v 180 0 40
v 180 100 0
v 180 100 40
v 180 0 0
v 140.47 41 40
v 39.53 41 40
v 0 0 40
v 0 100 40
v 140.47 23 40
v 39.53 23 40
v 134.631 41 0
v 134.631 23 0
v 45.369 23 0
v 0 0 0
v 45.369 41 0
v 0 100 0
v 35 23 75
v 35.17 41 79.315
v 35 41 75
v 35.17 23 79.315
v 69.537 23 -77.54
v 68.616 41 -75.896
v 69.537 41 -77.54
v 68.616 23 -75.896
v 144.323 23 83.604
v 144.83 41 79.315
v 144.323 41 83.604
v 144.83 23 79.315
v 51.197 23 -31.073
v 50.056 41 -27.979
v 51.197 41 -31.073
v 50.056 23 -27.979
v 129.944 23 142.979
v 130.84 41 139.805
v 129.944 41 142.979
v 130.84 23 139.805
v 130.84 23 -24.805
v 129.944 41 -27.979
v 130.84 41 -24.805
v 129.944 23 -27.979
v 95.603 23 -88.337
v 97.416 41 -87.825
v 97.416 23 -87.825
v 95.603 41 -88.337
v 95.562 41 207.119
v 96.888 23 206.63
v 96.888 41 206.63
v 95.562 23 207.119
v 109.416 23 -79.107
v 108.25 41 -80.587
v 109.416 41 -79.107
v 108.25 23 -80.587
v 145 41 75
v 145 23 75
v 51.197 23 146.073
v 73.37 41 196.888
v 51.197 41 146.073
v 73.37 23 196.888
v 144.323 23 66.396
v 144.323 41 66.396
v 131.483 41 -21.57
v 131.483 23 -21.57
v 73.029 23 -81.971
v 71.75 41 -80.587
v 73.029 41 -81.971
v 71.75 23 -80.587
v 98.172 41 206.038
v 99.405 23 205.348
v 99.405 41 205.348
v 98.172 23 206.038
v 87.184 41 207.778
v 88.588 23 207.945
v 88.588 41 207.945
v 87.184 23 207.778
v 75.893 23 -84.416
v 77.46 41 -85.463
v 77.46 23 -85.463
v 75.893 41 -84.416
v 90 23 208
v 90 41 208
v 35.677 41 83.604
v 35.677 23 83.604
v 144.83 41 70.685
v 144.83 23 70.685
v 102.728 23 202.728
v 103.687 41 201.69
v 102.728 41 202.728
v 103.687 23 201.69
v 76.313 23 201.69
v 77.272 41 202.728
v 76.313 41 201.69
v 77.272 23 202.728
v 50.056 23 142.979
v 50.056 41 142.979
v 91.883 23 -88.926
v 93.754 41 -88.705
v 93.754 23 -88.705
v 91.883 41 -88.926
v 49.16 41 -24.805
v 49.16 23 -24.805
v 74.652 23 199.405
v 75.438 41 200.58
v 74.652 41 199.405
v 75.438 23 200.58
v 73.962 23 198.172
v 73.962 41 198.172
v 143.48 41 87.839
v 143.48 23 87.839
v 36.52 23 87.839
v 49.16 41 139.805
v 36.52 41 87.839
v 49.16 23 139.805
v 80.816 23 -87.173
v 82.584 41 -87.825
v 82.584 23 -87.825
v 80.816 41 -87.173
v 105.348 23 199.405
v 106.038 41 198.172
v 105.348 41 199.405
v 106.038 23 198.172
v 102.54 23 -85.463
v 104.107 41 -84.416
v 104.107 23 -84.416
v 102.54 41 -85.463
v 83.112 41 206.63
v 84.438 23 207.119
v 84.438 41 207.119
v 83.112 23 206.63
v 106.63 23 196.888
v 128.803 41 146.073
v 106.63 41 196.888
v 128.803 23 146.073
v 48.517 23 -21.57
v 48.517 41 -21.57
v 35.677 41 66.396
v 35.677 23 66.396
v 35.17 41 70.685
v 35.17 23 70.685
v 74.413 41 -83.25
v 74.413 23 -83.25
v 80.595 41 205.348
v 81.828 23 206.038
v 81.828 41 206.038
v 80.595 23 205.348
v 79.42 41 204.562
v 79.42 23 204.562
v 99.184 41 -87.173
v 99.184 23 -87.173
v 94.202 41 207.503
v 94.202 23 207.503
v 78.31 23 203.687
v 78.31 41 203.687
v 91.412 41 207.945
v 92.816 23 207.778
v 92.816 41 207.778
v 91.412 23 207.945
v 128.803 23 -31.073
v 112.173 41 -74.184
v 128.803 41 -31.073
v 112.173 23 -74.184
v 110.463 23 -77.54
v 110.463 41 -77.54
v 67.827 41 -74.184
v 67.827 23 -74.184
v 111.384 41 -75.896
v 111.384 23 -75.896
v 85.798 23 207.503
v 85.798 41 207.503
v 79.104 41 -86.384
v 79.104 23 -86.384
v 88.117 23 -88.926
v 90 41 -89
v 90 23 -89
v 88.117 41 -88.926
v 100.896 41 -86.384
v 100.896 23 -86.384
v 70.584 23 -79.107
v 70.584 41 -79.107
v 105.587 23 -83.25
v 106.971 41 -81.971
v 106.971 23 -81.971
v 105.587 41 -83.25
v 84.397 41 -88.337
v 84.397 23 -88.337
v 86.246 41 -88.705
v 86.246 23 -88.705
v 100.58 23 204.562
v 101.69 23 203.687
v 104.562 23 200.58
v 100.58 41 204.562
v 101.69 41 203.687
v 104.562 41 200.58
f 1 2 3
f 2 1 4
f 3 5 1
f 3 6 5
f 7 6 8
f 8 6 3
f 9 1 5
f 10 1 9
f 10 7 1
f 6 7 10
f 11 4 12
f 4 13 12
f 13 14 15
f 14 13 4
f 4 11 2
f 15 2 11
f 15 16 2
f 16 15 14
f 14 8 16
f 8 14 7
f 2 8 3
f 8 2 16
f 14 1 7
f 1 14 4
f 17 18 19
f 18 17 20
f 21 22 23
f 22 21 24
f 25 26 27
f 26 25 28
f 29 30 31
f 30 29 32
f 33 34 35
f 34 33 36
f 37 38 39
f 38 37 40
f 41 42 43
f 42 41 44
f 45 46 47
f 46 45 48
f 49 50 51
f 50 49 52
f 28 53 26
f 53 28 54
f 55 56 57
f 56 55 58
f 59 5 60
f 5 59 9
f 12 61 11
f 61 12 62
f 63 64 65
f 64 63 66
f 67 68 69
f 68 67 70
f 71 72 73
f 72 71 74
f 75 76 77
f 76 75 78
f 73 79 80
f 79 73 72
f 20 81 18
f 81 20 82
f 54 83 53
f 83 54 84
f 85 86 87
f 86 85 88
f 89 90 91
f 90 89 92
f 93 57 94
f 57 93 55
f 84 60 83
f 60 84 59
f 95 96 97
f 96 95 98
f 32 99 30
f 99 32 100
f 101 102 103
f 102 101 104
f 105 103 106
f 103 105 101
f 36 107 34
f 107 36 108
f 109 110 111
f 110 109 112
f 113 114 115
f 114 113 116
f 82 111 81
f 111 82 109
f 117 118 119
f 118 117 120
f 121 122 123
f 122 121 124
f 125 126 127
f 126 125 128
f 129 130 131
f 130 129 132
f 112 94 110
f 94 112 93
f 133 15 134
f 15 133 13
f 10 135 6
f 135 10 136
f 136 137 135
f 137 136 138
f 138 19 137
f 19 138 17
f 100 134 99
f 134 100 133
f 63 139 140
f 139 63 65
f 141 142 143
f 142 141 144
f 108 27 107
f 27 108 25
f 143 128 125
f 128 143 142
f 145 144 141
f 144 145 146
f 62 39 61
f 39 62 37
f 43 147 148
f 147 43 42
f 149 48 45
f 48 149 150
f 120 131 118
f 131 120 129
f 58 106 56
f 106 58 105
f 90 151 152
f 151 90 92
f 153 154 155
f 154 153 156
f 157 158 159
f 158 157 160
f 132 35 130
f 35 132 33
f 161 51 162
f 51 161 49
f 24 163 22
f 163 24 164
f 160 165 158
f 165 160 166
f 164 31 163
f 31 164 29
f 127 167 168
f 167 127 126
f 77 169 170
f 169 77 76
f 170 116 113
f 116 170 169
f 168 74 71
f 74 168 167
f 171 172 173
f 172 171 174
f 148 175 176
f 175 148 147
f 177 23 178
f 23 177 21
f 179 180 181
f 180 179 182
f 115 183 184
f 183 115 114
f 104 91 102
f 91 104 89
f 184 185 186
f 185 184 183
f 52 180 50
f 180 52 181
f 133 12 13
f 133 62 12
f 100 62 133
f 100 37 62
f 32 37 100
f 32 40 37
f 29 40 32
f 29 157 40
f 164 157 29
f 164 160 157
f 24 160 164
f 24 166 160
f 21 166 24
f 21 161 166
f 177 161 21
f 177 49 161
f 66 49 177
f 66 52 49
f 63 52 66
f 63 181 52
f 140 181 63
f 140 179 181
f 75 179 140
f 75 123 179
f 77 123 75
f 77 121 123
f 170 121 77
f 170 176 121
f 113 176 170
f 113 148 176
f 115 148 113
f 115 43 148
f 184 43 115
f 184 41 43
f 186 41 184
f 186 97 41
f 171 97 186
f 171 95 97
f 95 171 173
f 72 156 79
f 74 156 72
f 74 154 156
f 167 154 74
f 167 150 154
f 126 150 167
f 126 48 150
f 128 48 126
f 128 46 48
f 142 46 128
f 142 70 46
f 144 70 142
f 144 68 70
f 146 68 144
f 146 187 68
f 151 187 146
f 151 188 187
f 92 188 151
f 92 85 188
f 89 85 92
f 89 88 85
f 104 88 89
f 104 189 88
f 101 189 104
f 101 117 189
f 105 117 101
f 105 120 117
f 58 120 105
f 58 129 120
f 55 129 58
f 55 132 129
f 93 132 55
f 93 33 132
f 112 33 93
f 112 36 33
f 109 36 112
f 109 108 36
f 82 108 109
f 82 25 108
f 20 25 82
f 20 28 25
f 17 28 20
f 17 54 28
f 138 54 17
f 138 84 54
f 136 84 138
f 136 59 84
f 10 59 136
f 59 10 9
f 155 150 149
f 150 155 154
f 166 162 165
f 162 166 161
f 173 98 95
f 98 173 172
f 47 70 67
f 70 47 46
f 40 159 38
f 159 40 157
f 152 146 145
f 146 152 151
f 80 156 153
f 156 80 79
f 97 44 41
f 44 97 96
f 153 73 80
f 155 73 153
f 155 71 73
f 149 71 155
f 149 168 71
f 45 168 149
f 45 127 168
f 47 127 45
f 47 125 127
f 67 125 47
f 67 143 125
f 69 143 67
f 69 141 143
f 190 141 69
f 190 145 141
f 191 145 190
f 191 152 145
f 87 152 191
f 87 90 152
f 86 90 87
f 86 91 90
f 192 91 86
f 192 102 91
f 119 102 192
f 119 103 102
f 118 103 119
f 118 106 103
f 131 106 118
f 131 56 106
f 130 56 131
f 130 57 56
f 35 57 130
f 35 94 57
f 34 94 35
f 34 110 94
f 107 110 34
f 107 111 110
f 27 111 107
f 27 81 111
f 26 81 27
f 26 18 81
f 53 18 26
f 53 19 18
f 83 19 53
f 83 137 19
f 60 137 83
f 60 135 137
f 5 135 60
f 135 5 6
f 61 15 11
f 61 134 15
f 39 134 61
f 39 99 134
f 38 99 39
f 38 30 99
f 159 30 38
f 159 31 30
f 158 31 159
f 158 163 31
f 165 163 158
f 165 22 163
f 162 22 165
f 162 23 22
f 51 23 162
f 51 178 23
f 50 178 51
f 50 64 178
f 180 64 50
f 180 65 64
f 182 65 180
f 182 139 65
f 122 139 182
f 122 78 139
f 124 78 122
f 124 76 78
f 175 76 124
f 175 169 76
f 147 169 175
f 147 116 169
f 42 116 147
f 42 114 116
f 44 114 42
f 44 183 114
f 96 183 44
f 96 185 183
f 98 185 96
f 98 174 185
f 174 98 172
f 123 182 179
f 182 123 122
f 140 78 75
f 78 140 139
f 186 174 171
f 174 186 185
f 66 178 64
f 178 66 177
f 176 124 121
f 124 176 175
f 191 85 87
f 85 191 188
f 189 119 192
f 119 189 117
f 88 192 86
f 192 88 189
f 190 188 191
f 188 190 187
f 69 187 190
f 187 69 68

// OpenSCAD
//
// Guitar Case Monument - OpenSCAD
$fn=80;
baseLength=180; baseWidth=100; baseHeight=40;
caseHeight=220; caseThickness=18;
plaqueWidth=110; plaqueHeight=28; plaqueDepth=2;
module marbleBase(){
 difference(){
  cube([baseLength,baseWidth,baseHeight]);
  translate([(baseLength-plaqueWidth)/2,-0.01,baseHeight/2-plaqueHeight/2])
   rotate([90,0,0]) linear_extrude(plaqueDepth+0.02)
    square([plaqueWidth,plaqueHeight]);
 }
}
module guitarCase2D(){
 hull(){
  translate([0,150]) circle(r=18);
  translate([0,90]) circle(r=42);
  translate([0,35]) circle(r=55);
  translate([0,-55]) circle(r=42);
  translate([0,-105]) circle(r=24);
 }
}
module guitarCase(){linear_extrude(caseThickness) guitarCase2D();}
union(){
 marbleBase();
 translate([baseLength/2,baseWidth/2-caseThickness/2,baseHeight])
  rotate([90,0,0]) guitarCase();
}
